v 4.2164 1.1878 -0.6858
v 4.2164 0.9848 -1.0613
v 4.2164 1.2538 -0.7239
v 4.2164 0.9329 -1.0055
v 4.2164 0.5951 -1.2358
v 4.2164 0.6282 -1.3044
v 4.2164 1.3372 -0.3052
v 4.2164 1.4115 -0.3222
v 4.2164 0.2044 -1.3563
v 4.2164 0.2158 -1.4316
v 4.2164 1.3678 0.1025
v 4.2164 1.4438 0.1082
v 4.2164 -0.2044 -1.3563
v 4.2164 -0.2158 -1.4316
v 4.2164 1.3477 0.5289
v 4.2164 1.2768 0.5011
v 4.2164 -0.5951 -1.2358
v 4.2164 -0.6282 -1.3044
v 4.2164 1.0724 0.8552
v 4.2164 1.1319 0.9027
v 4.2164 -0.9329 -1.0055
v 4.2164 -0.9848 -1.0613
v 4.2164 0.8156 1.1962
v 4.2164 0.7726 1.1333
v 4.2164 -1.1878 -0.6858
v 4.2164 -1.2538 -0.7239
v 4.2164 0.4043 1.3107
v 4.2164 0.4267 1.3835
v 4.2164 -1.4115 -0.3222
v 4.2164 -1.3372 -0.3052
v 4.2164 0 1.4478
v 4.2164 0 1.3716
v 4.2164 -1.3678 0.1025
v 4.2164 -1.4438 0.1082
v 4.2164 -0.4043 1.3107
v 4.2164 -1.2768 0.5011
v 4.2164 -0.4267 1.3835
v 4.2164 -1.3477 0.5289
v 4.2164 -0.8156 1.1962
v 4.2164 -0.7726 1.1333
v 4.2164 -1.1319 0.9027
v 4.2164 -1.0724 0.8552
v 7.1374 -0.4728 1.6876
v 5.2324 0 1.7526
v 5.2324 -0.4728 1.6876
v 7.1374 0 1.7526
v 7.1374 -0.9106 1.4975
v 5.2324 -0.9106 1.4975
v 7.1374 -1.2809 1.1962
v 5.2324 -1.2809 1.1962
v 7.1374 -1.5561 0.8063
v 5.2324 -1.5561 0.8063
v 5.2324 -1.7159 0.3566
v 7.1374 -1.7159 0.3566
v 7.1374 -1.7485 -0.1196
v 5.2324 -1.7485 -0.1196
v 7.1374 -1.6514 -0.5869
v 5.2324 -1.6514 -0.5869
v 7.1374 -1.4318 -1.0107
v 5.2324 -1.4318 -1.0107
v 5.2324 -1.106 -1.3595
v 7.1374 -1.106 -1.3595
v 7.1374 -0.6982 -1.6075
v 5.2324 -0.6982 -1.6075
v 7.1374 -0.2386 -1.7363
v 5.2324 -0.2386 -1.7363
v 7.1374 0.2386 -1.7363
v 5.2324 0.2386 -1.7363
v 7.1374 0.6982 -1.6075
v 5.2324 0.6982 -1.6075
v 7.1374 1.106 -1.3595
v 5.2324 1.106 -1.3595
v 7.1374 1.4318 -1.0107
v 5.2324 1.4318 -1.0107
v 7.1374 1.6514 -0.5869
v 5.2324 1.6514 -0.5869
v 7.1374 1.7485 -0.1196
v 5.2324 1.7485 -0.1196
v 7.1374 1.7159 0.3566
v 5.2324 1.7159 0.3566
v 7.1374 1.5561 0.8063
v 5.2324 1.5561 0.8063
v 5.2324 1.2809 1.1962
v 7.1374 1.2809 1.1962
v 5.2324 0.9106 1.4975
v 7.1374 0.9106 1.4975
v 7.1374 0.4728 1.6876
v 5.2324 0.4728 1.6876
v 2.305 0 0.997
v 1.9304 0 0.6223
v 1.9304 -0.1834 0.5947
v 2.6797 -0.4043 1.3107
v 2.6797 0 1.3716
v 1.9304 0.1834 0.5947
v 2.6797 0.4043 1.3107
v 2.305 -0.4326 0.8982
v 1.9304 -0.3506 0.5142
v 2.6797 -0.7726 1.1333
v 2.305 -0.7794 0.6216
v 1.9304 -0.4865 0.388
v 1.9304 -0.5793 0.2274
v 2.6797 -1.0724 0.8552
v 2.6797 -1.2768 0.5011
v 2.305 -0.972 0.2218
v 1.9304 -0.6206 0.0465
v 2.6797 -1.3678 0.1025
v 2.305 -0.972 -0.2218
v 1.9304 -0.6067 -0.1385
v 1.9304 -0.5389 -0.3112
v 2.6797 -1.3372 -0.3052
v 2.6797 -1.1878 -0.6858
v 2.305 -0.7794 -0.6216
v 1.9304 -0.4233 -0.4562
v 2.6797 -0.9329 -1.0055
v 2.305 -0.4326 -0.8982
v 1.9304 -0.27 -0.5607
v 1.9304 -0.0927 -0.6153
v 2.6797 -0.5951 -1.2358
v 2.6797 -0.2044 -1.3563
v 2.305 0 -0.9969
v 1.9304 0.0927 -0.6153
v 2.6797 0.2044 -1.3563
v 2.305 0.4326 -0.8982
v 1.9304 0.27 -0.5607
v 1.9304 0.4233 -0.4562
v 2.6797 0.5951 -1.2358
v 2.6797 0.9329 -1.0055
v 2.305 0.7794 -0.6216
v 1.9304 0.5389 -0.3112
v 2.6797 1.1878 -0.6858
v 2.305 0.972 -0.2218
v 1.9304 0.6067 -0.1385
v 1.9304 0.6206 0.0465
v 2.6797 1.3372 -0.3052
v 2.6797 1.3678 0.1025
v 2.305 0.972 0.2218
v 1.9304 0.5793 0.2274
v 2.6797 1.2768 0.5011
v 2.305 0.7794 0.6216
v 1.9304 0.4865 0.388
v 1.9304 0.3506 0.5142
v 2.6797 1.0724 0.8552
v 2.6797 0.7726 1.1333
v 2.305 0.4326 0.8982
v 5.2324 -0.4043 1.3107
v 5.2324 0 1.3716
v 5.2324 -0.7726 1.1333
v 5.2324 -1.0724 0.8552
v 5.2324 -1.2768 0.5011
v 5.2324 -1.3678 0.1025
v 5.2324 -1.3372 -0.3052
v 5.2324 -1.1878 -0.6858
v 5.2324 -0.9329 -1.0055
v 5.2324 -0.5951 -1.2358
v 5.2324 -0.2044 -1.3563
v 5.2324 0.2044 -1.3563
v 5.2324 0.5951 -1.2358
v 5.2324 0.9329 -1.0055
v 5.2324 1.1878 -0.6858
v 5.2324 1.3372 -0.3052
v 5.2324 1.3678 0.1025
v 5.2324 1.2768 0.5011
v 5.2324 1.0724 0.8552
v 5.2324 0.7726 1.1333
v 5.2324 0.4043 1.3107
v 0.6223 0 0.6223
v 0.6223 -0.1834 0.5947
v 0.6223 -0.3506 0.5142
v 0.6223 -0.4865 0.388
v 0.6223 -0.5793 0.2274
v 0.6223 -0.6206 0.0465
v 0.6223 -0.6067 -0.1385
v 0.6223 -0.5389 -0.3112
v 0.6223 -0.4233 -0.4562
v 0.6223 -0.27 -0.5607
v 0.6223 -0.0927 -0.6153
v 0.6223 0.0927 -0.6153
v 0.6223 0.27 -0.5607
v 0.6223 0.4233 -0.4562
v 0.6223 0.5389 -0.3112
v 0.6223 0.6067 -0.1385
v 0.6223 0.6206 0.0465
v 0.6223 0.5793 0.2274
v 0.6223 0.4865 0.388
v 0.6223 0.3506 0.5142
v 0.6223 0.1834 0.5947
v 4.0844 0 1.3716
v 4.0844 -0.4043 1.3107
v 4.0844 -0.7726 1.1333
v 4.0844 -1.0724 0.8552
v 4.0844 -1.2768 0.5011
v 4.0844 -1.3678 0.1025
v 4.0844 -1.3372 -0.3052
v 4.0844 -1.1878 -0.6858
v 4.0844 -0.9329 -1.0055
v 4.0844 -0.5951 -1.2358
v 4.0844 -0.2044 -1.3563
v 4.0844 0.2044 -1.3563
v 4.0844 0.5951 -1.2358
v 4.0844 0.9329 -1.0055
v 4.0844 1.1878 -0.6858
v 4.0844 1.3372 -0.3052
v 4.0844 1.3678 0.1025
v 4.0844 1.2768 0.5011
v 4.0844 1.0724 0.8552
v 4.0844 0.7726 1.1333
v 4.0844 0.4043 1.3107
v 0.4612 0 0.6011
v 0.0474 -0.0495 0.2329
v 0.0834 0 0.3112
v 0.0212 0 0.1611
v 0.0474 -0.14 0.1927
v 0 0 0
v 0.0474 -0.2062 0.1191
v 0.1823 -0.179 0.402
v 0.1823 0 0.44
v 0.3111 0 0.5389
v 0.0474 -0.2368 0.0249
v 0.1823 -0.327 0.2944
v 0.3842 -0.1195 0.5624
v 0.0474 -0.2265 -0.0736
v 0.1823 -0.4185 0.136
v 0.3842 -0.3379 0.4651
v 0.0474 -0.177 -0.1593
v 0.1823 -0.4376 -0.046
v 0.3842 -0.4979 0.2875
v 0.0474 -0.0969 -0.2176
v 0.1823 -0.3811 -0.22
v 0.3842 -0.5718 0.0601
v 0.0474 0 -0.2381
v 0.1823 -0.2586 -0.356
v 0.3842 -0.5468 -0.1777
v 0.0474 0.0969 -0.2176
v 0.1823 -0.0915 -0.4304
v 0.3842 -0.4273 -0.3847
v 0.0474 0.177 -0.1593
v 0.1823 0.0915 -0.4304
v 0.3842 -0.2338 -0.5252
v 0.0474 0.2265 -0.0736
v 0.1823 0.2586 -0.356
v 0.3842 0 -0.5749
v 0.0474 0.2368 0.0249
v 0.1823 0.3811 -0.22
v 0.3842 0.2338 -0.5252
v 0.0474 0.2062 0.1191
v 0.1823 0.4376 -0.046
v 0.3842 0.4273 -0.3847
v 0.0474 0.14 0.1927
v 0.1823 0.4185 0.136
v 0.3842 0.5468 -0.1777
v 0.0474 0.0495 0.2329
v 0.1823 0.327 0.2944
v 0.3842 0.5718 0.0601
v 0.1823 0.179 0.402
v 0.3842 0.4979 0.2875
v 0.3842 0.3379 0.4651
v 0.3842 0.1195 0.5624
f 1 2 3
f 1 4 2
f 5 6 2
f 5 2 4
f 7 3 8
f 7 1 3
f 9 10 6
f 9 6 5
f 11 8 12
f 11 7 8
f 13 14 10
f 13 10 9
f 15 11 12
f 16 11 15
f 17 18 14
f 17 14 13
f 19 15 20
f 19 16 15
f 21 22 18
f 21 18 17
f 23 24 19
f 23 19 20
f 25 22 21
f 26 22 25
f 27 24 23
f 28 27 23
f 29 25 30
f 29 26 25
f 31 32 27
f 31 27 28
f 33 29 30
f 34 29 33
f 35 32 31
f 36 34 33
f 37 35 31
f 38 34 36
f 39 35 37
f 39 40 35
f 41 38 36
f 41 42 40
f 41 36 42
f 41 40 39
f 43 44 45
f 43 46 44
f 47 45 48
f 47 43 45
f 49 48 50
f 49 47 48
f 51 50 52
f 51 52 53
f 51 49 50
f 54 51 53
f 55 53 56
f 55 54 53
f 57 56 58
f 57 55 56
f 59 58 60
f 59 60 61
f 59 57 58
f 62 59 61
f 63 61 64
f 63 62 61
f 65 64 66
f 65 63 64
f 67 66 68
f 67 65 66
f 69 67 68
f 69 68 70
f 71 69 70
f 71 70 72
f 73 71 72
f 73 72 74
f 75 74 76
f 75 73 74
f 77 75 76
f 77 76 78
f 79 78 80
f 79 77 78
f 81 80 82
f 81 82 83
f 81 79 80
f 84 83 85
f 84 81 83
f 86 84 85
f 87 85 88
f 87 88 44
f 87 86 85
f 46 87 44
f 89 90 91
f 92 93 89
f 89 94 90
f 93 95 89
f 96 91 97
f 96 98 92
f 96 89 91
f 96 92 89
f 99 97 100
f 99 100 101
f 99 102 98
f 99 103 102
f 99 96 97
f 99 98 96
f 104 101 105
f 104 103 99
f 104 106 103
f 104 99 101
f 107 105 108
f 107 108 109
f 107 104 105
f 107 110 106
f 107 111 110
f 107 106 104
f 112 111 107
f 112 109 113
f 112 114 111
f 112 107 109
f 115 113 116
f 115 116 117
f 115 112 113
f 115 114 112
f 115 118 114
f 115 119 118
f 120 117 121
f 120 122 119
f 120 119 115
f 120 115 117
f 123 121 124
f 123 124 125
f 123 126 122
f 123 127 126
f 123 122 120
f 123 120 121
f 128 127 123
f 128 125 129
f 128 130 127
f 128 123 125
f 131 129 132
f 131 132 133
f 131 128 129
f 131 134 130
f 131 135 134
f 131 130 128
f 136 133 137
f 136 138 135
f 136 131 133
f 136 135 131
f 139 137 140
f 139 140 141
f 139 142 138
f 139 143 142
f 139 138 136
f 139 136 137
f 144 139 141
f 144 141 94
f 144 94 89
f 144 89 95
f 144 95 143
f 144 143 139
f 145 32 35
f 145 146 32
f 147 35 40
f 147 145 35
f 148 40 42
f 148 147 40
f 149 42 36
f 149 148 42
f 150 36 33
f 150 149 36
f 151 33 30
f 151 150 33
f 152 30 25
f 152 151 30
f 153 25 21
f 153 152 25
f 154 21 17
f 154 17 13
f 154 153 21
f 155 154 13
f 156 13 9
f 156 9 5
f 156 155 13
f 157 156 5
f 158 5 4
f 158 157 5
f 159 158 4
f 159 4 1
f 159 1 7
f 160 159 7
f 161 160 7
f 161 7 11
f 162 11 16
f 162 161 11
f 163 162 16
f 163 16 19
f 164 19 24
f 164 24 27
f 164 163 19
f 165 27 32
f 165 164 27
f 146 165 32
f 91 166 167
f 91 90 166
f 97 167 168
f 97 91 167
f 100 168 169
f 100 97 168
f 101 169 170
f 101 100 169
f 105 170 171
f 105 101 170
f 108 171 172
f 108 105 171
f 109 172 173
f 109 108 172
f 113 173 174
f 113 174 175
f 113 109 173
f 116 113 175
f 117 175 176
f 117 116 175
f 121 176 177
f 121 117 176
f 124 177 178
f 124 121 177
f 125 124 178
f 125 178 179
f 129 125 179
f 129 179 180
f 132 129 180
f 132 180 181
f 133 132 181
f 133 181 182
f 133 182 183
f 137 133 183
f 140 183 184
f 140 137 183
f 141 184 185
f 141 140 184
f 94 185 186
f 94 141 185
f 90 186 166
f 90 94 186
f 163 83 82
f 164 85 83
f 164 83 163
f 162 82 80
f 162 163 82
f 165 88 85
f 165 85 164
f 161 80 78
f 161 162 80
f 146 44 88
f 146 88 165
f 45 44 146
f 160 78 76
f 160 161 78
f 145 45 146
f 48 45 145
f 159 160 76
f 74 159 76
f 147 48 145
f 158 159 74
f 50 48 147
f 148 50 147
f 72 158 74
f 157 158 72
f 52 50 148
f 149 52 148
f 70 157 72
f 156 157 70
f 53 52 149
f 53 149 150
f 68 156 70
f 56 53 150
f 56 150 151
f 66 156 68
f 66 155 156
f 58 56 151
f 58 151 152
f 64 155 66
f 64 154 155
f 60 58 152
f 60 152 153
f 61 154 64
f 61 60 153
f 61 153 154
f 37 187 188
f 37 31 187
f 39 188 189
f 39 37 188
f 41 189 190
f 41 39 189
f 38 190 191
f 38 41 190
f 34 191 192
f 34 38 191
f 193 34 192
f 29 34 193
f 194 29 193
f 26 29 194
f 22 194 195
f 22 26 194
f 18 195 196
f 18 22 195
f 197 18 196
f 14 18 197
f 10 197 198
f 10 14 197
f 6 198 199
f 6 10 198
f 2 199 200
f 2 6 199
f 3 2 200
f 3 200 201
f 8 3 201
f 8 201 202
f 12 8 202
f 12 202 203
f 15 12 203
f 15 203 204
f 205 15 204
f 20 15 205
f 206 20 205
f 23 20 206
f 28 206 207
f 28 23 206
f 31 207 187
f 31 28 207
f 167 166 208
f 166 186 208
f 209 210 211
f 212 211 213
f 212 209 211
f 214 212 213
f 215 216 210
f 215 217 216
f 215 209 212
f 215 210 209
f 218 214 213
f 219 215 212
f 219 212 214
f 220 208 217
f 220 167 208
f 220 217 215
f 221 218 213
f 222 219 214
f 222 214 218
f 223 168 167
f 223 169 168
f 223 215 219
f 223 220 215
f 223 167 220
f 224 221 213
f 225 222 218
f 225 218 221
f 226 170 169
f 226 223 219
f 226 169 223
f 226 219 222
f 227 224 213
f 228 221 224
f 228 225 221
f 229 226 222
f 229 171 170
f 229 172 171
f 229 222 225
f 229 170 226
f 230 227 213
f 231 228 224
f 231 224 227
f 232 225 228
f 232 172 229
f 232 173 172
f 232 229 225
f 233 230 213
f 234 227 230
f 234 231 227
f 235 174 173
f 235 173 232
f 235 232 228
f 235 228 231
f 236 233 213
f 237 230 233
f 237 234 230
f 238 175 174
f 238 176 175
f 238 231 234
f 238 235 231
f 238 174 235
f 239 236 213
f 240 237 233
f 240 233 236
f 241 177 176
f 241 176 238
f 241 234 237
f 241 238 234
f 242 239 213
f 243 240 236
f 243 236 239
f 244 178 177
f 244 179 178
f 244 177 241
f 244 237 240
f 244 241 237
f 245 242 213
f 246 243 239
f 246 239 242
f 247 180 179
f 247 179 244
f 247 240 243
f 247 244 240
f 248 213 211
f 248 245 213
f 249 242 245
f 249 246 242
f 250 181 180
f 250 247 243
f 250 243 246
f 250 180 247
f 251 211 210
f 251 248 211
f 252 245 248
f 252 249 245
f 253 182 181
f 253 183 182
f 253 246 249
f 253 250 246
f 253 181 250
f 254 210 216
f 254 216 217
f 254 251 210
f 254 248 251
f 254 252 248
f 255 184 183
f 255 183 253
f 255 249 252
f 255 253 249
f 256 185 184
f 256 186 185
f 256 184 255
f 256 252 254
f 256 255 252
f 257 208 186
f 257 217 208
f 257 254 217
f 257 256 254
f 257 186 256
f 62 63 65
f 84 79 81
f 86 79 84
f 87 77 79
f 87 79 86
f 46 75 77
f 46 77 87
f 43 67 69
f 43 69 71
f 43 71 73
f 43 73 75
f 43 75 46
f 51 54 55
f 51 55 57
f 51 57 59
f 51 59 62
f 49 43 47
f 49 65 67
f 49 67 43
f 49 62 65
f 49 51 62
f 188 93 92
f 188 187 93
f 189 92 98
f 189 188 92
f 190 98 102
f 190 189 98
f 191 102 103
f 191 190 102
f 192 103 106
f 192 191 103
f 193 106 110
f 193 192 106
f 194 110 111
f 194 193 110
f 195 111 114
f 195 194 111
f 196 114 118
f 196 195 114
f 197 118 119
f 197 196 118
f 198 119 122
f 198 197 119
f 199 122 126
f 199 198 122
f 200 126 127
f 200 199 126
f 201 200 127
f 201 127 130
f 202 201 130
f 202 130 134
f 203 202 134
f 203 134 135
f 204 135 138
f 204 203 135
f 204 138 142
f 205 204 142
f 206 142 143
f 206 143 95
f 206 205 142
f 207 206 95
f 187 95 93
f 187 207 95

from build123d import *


with BuildPart() as part:
    # Sketch1 → Revolve1 (revolve)
    with BuildSketch(Plane.XY, mode=Mode.PRIVATE) as revolve1_sk:
        Polygon((0, 0), (0, 0.6223), (1.9304, 0.6223), (2.6797, 1.3716), (4.084417728, 1.3716), (4.2164, 1.4478), (4.2164, 1.3716), (5.2324, 1.3716), (5.2324, 1.7526), (7.1374, 1.7526), (7.1374, 0), align=None)
    revolve(revolve1_sk.sketch.rotate(Axis((-2.173675745, 0, 0), (1, 0, 0)), 90), axis=Axis((-2.173675745, 0, 0), (1, 0, 0)))

    # Sketch2 → Cut-Revolve1 (revolve, cut)
    with BuildSketch(Plane.XY, mode=Mode.PRIVATE) as cut_revolve1_sk:
        with BuildLine():
            Line((0.6223, 0.6223), (-0.23767542, 0.6223))
            Line((-0.23767542, 0.6223), (-0.23767542, 0))
            Line((-0.23767542, 0), (0, 0))
            ThreePointArc((0, 0), (0.18226745, 0.44003255), (0.6223, 0.6223))
        make_face()
    revolve(cut_revolve1_sk.sketch.rotate(Axis((-2.173675745, 0, 0), (1, 0, 0)), 90), axis=Axis((-2.173675745, 0, 0), (1, 0, 0)), mode=Mode.SUBTRACT)


solid = part.part
